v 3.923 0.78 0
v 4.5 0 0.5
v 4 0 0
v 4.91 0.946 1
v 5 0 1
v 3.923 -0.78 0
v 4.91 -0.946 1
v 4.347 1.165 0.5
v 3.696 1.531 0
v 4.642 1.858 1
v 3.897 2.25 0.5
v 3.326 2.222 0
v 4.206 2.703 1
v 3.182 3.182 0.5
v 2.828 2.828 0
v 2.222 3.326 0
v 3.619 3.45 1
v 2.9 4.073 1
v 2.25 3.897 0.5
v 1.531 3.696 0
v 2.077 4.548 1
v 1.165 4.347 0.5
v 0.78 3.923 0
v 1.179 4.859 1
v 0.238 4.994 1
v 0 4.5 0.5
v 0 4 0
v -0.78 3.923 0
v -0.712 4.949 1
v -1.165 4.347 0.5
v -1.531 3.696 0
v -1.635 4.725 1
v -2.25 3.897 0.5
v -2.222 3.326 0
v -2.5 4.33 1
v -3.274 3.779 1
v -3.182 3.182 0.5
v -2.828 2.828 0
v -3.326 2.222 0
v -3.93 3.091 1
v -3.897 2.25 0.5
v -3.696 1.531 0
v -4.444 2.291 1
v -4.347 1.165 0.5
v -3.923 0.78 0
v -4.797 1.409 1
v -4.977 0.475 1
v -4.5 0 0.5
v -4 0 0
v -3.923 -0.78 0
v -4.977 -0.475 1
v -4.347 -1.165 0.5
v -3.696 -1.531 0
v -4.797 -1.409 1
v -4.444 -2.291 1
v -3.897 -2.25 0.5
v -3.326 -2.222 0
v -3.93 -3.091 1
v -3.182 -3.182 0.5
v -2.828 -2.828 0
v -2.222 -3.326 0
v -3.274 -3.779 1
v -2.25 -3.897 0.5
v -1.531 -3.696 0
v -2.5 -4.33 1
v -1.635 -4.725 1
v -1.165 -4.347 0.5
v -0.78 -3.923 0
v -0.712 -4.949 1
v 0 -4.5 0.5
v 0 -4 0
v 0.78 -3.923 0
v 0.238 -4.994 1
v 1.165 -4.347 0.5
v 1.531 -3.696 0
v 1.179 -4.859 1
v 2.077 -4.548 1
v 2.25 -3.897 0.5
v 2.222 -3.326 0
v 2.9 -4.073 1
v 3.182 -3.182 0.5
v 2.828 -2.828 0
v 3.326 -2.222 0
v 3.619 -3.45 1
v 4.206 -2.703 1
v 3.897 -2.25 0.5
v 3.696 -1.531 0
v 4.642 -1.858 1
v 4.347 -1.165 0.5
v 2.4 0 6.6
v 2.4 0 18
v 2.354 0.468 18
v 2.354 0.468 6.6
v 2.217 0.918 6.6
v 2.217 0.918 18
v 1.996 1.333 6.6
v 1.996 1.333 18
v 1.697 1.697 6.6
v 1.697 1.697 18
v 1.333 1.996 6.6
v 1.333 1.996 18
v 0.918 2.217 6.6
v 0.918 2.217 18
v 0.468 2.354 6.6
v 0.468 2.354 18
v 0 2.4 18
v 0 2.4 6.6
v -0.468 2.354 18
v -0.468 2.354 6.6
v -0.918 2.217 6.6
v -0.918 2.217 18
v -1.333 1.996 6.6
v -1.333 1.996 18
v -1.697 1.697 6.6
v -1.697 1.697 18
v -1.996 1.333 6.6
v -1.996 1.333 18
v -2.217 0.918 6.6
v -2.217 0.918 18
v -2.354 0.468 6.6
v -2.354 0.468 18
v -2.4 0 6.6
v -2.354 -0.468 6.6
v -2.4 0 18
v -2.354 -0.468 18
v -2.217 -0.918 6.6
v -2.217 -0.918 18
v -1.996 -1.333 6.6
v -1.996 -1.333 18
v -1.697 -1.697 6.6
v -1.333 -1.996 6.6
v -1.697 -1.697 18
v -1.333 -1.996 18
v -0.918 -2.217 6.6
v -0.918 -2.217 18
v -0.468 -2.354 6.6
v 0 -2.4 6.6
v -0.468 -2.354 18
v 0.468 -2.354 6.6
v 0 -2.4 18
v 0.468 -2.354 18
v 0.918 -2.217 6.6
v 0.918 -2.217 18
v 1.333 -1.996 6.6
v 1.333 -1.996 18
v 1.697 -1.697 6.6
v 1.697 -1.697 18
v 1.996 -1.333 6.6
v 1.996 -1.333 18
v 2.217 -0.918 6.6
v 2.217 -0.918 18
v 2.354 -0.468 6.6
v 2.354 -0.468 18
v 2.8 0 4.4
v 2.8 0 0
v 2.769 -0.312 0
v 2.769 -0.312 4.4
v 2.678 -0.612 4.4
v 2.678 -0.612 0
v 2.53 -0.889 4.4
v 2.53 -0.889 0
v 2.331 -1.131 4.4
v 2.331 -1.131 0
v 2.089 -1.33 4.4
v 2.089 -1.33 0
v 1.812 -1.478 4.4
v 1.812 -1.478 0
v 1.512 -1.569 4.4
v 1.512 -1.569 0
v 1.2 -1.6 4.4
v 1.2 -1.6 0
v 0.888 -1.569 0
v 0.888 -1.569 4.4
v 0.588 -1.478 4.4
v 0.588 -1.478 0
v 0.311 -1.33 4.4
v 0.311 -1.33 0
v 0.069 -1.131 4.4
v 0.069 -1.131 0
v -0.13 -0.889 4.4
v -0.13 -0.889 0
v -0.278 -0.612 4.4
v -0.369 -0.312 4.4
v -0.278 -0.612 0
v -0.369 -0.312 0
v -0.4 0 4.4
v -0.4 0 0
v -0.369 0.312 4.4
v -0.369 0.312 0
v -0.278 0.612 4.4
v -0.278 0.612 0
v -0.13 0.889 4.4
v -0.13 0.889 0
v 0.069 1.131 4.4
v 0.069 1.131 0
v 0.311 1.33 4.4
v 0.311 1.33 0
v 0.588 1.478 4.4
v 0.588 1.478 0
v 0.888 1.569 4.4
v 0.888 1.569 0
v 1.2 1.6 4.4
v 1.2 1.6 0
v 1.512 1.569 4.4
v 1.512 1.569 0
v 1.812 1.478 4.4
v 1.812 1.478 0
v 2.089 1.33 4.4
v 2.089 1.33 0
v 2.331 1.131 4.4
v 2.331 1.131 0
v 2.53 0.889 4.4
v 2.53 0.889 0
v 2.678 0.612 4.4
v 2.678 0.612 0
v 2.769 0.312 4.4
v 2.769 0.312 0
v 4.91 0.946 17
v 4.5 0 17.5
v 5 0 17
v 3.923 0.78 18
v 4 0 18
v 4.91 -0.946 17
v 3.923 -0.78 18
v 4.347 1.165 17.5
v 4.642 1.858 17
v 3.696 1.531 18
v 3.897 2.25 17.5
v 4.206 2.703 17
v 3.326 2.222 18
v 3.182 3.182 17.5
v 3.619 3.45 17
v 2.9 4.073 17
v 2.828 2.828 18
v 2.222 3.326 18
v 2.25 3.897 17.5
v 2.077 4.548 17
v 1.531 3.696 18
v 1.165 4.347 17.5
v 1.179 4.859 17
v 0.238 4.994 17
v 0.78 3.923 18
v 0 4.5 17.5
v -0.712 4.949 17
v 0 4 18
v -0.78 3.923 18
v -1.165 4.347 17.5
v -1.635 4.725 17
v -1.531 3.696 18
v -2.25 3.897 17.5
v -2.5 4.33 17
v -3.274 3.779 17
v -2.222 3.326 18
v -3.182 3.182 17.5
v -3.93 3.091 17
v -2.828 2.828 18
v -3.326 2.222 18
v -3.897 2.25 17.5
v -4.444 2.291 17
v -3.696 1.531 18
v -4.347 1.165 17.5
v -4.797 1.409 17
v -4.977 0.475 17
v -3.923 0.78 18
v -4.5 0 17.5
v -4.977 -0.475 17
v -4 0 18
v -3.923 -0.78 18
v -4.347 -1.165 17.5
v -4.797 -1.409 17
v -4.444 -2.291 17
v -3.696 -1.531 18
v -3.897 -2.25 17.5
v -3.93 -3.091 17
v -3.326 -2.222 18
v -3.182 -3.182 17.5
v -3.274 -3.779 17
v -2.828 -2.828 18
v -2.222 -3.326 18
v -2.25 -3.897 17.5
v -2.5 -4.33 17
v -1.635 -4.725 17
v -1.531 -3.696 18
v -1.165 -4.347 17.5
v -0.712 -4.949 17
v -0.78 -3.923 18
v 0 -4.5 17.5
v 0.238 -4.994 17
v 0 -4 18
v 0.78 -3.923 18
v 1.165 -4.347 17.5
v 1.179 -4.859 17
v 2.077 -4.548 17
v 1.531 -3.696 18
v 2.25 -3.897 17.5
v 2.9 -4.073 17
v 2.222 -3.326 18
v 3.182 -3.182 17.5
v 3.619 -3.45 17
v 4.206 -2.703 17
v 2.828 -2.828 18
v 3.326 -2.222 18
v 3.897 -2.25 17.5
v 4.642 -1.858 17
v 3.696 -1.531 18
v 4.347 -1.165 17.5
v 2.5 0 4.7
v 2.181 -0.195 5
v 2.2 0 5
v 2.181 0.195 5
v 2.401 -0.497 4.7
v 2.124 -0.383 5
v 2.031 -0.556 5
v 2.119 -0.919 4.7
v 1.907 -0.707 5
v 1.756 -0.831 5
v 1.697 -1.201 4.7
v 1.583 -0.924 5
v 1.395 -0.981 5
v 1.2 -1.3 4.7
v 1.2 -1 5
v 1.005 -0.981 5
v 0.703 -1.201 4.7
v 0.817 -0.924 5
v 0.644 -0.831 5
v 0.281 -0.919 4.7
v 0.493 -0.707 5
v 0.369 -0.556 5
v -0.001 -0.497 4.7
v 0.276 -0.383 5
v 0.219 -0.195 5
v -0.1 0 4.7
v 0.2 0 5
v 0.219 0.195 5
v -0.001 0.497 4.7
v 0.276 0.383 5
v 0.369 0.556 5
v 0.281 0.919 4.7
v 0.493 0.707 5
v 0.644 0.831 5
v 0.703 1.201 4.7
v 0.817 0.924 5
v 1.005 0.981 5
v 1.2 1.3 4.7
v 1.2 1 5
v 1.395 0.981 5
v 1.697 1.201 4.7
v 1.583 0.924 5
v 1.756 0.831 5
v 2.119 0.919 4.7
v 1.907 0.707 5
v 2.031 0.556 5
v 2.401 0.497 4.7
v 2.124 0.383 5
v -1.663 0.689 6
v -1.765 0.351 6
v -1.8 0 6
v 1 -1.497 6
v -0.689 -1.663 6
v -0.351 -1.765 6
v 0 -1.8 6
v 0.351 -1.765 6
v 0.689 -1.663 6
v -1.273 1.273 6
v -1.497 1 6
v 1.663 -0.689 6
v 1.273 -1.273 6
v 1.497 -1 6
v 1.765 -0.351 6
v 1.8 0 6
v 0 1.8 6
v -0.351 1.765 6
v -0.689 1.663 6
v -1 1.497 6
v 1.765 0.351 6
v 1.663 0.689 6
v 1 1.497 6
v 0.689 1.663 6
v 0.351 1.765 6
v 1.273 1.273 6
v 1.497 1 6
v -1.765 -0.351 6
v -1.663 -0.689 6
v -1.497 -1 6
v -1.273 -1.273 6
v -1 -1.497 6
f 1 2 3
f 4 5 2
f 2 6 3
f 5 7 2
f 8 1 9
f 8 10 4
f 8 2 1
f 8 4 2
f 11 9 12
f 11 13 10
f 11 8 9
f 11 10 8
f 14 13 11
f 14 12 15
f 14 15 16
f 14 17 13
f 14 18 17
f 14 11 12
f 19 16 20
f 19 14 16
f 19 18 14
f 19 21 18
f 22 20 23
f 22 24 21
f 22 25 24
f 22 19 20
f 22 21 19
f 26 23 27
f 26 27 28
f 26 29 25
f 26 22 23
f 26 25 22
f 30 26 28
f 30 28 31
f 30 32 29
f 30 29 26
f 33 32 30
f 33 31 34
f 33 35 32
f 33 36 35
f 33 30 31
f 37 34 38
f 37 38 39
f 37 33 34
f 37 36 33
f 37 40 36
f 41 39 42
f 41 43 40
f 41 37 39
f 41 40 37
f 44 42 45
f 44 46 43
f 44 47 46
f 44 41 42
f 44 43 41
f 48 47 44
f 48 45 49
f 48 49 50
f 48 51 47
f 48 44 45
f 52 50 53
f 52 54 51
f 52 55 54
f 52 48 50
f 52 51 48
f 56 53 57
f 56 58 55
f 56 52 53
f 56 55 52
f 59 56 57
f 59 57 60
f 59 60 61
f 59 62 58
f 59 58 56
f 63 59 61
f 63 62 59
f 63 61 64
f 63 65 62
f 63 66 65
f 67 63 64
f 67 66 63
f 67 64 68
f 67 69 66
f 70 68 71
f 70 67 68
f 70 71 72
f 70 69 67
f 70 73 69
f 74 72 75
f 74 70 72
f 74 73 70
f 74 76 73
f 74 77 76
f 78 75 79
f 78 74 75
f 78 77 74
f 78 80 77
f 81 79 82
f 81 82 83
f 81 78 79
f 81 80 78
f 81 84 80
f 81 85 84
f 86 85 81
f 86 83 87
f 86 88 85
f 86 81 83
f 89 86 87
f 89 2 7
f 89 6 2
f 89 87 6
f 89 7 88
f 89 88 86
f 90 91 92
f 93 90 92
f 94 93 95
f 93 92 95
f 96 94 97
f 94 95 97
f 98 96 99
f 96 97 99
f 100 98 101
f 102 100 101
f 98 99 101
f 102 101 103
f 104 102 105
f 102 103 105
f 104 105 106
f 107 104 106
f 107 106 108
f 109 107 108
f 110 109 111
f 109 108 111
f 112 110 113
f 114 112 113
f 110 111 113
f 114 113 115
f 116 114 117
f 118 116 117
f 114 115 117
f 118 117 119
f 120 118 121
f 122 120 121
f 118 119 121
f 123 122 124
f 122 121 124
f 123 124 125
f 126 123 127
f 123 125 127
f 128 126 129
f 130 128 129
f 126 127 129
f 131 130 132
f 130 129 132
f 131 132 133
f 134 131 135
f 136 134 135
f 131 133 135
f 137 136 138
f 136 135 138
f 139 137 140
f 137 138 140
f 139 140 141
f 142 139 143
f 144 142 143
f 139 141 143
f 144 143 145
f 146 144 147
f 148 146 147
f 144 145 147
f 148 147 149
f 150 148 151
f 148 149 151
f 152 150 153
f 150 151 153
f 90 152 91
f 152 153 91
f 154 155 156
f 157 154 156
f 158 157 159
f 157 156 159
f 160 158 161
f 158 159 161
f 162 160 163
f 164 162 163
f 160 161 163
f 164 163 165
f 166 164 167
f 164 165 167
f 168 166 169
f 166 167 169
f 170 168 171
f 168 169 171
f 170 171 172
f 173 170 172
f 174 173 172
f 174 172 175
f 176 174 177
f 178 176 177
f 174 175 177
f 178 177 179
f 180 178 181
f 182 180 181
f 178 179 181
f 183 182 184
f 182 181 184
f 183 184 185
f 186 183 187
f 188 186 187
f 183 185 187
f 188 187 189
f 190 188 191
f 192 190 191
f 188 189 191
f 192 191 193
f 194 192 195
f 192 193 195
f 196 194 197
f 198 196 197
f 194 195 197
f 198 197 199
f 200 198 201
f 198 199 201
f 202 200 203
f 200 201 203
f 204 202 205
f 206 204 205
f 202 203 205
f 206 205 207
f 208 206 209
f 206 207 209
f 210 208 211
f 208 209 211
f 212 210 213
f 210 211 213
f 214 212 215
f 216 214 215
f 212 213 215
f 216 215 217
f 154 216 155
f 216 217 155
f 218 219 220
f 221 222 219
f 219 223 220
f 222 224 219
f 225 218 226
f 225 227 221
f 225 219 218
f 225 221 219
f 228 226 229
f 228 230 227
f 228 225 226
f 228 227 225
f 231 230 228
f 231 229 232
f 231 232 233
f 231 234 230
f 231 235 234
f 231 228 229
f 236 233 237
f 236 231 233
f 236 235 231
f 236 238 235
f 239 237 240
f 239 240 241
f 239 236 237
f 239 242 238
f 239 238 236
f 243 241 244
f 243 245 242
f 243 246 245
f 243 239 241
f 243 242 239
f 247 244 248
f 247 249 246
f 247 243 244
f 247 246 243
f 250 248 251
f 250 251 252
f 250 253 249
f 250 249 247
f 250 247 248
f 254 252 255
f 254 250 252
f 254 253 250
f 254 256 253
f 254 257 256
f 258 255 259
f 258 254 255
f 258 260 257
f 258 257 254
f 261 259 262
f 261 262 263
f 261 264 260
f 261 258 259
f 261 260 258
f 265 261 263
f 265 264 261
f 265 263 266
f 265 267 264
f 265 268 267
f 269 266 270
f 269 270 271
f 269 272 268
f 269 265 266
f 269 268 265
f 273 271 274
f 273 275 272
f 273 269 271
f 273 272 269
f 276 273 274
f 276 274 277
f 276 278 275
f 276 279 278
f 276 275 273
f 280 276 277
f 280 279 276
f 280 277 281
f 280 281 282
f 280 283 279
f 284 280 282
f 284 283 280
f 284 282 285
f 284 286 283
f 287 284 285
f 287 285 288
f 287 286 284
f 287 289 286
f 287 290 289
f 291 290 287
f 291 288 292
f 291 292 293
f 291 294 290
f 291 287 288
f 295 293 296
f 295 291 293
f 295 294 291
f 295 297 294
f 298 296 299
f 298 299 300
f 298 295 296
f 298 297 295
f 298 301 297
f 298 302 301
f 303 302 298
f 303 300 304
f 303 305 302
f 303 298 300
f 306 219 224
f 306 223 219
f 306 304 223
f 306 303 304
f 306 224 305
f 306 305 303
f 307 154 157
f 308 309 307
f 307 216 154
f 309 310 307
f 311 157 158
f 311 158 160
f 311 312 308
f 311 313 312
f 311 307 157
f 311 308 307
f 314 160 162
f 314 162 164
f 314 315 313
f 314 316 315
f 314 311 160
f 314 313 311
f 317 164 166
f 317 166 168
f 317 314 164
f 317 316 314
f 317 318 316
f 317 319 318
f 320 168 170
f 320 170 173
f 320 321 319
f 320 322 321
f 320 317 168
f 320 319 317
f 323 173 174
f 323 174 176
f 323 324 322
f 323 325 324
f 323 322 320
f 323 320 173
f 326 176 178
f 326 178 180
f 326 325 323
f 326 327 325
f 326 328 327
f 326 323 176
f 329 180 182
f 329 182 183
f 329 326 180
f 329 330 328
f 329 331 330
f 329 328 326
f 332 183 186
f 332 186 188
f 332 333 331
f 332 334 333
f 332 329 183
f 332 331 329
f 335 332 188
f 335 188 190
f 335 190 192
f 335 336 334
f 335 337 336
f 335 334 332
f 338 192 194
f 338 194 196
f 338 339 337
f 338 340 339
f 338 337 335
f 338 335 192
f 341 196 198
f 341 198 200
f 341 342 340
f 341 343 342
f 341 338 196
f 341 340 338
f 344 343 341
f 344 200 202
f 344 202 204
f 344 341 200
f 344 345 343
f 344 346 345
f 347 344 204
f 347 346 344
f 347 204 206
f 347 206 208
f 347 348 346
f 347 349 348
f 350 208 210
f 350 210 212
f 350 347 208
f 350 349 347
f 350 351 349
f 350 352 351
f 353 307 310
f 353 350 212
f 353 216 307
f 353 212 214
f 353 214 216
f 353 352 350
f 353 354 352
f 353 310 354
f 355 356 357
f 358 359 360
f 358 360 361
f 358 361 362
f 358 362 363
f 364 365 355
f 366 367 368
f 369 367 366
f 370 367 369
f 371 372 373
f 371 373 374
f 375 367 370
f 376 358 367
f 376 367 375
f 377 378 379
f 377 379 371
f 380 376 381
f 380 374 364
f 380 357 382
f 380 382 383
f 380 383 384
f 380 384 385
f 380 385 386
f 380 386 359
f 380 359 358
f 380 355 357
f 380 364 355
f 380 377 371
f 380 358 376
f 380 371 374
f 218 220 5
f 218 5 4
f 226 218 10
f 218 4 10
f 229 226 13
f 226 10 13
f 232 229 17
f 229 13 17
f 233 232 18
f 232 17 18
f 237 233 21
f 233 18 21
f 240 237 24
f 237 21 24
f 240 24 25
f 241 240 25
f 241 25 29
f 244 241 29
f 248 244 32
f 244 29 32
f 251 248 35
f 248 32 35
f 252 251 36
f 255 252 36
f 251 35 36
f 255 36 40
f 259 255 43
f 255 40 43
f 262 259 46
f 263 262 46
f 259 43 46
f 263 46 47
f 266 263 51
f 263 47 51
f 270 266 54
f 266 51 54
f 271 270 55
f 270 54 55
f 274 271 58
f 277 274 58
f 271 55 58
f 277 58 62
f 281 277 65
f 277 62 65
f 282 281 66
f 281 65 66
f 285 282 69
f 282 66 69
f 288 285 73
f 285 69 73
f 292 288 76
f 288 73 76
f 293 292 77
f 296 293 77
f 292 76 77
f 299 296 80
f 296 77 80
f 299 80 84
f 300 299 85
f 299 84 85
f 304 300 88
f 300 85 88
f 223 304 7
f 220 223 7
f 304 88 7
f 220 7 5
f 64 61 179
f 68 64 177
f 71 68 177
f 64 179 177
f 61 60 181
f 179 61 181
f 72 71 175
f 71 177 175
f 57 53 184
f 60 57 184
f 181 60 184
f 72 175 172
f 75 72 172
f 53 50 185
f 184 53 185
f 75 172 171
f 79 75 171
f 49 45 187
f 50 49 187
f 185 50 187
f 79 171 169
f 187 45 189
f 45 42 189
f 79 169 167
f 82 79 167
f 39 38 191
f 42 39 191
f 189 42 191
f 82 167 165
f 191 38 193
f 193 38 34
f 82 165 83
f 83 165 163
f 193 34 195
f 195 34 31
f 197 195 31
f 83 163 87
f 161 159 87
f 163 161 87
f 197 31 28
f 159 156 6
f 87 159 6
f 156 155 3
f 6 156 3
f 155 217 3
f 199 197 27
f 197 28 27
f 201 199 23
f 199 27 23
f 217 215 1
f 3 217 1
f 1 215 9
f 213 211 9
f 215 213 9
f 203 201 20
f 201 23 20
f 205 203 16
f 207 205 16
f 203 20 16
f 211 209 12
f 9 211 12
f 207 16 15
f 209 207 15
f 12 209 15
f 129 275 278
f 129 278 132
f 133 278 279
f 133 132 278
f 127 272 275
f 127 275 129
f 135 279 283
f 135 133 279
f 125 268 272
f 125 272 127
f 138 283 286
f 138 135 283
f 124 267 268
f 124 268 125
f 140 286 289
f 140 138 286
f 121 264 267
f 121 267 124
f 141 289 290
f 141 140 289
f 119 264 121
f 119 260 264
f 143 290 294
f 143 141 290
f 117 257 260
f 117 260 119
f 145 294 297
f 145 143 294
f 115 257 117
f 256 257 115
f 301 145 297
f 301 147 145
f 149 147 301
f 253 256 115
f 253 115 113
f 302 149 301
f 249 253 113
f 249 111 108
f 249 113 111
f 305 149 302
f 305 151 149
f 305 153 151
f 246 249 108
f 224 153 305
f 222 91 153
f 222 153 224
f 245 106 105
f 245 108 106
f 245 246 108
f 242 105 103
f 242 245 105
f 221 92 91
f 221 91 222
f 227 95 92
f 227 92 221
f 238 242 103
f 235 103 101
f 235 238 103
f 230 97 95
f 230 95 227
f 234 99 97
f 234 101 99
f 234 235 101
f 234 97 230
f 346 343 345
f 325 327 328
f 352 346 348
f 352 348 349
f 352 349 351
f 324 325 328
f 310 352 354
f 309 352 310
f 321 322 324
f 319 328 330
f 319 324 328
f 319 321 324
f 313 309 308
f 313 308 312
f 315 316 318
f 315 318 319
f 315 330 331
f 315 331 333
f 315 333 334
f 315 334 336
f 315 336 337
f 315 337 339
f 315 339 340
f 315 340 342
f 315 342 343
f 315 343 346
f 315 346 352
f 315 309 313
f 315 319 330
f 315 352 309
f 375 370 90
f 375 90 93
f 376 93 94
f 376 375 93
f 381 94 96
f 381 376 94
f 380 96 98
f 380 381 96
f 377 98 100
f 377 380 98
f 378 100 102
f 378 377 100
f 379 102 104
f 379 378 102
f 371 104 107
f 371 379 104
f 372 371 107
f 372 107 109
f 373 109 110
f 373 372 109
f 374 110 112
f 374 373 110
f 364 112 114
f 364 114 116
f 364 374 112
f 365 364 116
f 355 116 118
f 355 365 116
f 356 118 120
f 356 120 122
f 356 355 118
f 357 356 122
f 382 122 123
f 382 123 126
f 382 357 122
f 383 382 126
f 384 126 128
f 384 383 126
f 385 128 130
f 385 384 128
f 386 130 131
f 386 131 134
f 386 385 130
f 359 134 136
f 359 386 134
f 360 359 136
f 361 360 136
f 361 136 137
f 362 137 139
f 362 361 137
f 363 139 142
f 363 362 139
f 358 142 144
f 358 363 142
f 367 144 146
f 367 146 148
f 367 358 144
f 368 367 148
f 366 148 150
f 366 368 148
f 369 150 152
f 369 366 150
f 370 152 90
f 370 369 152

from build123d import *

# Parameters (mm, degrees)
F0_R     = 5
F1_DEPTH = 18
F2_R     = 2.4
F3_DEPTH = 12
F4_R     = 1.6
F5_DEPTH = 5
F6_SIZE  = 0.6
F7_SIZE  = 1


with BuildPart() as f1:
    # F0 (on Top) → F1 (new body)
    with BuildSketch(Plane.XY):
        Circle(F0_R)
    extrude(amount=F1_DEPTH)

    # F2 (on face) → F3 (cut)
    with BuildSketch(Plane.XY.offset(18)):
        Circle(F2_R)
    extrude(amount=-F3_DEPTH, mode=Mode.SUBTRACT)

    # F4 (on face) → F5 (cut)
    with BuildSketch(Plane(origin=(0, 0, 0), x_dir=(1, 0, 0), z_dir=(0, 0, -1))):
        with Locations((1.2, 0)):
            Circle(F4_R)
    extrude(amount=-F5_DEPTH, mode=Mode.SUBTRACT)

    # F6
    f6_edges = [f1.edges().sort_by_distance(p)[0] for p in [
        (-0.4, 0, 5),
        (-2.4, 0, 6),
    ]]
    chamfer(f6_edges, length=F6_SIZE)

    # F7
    f7_edges = [f1.edges().sort_by_distance(p)[0] for p in [
        (-5, 0, 0),
        (-5, 0, 18),
    ]]
    chamfer(f7_edges, length=F7_SIZE)


solid = f1.part
